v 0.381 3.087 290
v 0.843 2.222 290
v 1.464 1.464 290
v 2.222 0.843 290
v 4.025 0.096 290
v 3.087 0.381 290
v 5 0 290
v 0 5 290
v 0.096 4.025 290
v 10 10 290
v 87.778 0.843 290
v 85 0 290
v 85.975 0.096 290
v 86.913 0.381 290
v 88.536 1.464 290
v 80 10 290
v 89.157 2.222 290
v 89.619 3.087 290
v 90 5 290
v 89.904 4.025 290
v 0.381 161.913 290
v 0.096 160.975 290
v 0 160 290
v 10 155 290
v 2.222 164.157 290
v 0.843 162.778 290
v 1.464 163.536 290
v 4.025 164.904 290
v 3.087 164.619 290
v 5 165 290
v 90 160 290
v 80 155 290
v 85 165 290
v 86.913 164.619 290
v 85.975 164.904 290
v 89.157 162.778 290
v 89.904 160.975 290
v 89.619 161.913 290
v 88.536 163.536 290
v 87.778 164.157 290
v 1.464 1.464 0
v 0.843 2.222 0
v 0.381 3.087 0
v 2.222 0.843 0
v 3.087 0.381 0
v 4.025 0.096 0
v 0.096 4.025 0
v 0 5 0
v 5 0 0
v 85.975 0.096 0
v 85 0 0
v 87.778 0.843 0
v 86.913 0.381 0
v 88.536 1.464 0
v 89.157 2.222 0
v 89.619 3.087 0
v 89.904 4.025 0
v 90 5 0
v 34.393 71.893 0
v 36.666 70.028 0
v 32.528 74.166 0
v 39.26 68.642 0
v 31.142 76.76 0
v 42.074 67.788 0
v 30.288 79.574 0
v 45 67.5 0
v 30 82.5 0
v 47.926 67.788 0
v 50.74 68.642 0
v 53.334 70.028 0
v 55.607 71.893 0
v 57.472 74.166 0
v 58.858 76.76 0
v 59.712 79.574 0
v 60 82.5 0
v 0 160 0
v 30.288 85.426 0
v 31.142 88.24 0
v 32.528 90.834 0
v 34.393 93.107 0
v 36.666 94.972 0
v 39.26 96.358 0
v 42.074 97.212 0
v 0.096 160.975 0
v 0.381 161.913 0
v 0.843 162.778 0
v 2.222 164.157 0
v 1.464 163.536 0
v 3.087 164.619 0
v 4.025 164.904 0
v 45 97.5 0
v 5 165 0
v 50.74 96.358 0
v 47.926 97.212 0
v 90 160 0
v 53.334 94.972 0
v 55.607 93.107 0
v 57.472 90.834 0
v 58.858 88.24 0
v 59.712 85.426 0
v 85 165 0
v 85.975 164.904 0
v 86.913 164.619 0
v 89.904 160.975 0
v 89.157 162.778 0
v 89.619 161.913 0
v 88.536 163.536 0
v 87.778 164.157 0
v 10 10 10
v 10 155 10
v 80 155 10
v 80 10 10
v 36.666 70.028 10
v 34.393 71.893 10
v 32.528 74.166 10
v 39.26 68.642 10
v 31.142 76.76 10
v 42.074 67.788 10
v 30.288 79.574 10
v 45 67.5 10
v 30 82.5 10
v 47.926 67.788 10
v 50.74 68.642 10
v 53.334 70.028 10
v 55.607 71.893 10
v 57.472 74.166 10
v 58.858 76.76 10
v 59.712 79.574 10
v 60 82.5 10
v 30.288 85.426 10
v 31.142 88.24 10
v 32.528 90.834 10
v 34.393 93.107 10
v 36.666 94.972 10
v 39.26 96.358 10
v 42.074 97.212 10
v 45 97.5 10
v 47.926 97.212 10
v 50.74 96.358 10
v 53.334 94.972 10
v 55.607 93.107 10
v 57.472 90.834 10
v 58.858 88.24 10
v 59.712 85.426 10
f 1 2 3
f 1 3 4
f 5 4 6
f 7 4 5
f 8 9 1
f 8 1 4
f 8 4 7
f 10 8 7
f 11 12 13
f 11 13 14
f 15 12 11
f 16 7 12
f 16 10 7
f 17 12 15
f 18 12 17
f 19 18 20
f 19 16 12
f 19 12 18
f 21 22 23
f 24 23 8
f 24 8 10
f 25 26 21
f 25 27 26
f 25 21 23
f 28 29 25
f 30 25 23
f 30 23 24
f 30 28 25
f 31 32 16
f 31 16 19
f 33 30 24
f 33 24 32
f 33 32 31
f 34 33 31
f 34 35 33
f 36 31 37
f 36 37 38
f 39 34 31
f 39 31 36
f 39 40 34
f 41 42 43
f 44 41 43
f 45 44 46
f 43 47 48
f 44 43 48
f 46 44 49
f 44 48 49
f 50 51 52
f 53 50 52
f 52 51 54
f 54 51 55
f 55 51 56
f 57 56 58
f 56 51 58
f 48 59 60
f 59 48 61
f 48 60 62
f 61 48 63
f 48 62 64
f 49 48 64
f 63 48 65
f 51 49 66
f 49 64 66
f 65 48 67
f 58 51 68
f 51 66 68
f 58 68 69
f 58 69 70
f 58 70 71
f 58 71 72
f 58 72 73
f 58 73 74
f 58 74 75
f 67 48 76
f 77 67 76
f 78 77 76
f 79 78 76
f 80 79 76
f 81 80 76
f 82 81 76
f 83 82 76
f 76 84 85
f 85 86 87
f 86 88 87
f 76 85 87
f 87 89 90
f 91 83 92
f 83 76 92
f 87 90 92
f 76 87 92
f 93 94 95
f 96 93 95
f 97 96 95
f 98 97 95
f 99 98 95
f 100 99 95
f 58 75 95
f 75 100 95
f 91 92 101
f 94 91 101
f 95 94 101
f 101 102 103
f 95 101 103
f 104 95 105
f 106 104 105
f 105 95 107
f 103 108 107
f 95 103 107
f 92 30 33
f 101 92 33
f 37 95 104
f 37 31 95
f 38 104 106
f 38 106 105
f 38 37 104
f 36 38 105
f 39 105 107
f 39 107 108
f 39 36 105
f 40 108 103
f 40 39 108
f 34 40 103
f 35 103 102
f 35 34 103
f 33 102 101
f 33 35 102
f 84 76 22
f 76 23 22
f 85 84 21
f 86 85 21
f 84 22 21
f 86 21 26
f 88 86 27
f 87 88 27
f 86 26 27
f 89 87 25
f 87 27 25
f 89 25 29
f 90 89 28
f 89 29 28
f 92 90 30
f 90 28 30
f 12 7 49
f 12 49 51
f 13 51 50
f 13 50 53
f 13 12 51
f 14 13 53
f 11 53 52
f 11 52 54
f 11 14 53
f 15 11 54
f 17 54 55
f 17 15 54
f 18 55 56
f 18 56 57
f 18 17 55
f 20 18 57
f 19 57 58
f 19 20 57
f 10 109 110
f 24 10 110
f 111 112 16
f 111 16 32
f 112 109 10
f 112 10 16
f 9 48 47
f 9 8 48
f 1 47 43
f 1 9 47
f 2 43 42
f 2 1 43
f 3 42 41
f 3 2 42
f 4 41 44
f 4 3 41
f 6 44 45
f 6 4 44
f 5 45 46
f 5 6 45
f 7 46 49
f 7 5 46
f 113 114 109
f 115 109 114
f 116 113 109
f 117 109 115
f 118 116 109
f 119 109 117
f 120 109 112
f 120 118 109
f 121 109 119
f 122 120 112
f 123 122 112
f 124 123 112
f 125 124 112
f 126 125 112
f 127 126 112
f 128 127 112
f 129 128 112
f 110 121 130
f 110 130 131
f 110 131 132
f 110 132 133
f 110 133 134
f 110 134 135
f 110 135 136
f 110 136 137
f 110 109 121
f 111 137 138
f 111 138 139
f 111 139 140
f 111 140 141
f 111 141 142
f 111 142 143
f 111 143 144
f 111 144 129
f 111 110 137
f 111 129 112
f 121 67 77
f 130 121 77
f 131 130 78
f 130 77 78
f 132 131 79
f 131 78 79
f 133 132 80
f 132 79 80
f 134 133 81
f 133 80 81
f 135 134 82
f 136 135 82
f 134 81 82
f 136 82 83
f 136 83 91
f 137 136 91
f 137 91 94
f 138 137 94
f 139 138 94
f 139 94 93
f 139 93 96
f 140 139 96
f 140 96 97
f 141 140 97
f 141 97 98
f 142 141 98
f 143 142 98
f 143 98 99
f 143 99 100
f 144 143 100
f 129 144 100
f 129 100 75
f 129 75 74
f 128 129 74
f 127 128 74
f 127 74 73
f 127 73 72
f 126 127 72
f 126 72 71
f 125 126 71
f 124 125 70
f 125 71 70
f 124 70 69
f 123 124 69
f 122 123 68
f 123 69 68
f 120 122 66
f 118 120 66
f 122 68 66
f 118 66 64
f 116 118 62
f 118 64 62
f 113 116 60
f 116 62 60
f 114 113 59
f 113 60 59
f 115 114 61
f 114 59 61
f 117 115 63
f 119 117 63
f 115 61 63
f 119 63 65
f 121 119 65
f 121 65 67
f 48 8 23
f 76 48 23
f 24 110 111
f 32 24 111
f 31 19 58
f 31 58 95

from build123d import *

# Parameters (mm, degrees)
SKETCH_1_W          = 90
SKETCH_1_H          = 165
EXTRUDE_1_DEPTH     = 290
SHELL_1_T           = -10
FILLET_1_R          = 5
CUT_EXTRUDE_1_REACH = 347.579
SKETCH_2_R          = 15


with BuildPart() as part:
    # 스케치1 → 보스-돌출1 (new body)
    with BuildSketch(Plane.XY):
        with Locations((45, 82.5)):
            Rectangle(SKETCH_1_W, SKETCH_1_H)
    extrude(amount=EXTRUDE_1_DEPTH)

    # 쉘1
    shell_1_openings = [part.faces().sort_by_distance(p)[0] for p in [
        (45, 82.5, 290),
    ]]
    offset(amount=SHELL_1_T, openings=shell_1_openings, kind=Kind.INTERSECTION)

    # 필렛1
    fillet_1_edges = [part.edges().sort_by_distance(p)[0] for p in [
        (0, 165, 145),
        (90, 165, 145),
        (90, 0, 145),
        (0, 0, 145),
    ]]
    fillet(fillet_1_edges, radius=FILLET_1_R)

    # 스케치2 → 컷-돌출1 (cut, up to next)
    with BuildSketch(Plane(origin=(0, 0, 0), x_dir=(-1, 0, 0), z_dir=(0, 0, -1)), mode=Mode.PRIVATE) as cut_extrude_1_sk1:
        with Locations((-45, 82.5)):
            Circle(SKETCH_2_R)
    cut_extrude_1_tool1 = extrude(cut_extrude_1_sk1.sketch, amount=-CUT_EXTRUDE_1_REACH, mode=Mode.PRIVATE) & part.part
    add(cut_extrude_1_tool1.solids().sort_by_distance((45, 82.5, 0))[0], mode=Mode.SUBTRACT)


solid = part.part
